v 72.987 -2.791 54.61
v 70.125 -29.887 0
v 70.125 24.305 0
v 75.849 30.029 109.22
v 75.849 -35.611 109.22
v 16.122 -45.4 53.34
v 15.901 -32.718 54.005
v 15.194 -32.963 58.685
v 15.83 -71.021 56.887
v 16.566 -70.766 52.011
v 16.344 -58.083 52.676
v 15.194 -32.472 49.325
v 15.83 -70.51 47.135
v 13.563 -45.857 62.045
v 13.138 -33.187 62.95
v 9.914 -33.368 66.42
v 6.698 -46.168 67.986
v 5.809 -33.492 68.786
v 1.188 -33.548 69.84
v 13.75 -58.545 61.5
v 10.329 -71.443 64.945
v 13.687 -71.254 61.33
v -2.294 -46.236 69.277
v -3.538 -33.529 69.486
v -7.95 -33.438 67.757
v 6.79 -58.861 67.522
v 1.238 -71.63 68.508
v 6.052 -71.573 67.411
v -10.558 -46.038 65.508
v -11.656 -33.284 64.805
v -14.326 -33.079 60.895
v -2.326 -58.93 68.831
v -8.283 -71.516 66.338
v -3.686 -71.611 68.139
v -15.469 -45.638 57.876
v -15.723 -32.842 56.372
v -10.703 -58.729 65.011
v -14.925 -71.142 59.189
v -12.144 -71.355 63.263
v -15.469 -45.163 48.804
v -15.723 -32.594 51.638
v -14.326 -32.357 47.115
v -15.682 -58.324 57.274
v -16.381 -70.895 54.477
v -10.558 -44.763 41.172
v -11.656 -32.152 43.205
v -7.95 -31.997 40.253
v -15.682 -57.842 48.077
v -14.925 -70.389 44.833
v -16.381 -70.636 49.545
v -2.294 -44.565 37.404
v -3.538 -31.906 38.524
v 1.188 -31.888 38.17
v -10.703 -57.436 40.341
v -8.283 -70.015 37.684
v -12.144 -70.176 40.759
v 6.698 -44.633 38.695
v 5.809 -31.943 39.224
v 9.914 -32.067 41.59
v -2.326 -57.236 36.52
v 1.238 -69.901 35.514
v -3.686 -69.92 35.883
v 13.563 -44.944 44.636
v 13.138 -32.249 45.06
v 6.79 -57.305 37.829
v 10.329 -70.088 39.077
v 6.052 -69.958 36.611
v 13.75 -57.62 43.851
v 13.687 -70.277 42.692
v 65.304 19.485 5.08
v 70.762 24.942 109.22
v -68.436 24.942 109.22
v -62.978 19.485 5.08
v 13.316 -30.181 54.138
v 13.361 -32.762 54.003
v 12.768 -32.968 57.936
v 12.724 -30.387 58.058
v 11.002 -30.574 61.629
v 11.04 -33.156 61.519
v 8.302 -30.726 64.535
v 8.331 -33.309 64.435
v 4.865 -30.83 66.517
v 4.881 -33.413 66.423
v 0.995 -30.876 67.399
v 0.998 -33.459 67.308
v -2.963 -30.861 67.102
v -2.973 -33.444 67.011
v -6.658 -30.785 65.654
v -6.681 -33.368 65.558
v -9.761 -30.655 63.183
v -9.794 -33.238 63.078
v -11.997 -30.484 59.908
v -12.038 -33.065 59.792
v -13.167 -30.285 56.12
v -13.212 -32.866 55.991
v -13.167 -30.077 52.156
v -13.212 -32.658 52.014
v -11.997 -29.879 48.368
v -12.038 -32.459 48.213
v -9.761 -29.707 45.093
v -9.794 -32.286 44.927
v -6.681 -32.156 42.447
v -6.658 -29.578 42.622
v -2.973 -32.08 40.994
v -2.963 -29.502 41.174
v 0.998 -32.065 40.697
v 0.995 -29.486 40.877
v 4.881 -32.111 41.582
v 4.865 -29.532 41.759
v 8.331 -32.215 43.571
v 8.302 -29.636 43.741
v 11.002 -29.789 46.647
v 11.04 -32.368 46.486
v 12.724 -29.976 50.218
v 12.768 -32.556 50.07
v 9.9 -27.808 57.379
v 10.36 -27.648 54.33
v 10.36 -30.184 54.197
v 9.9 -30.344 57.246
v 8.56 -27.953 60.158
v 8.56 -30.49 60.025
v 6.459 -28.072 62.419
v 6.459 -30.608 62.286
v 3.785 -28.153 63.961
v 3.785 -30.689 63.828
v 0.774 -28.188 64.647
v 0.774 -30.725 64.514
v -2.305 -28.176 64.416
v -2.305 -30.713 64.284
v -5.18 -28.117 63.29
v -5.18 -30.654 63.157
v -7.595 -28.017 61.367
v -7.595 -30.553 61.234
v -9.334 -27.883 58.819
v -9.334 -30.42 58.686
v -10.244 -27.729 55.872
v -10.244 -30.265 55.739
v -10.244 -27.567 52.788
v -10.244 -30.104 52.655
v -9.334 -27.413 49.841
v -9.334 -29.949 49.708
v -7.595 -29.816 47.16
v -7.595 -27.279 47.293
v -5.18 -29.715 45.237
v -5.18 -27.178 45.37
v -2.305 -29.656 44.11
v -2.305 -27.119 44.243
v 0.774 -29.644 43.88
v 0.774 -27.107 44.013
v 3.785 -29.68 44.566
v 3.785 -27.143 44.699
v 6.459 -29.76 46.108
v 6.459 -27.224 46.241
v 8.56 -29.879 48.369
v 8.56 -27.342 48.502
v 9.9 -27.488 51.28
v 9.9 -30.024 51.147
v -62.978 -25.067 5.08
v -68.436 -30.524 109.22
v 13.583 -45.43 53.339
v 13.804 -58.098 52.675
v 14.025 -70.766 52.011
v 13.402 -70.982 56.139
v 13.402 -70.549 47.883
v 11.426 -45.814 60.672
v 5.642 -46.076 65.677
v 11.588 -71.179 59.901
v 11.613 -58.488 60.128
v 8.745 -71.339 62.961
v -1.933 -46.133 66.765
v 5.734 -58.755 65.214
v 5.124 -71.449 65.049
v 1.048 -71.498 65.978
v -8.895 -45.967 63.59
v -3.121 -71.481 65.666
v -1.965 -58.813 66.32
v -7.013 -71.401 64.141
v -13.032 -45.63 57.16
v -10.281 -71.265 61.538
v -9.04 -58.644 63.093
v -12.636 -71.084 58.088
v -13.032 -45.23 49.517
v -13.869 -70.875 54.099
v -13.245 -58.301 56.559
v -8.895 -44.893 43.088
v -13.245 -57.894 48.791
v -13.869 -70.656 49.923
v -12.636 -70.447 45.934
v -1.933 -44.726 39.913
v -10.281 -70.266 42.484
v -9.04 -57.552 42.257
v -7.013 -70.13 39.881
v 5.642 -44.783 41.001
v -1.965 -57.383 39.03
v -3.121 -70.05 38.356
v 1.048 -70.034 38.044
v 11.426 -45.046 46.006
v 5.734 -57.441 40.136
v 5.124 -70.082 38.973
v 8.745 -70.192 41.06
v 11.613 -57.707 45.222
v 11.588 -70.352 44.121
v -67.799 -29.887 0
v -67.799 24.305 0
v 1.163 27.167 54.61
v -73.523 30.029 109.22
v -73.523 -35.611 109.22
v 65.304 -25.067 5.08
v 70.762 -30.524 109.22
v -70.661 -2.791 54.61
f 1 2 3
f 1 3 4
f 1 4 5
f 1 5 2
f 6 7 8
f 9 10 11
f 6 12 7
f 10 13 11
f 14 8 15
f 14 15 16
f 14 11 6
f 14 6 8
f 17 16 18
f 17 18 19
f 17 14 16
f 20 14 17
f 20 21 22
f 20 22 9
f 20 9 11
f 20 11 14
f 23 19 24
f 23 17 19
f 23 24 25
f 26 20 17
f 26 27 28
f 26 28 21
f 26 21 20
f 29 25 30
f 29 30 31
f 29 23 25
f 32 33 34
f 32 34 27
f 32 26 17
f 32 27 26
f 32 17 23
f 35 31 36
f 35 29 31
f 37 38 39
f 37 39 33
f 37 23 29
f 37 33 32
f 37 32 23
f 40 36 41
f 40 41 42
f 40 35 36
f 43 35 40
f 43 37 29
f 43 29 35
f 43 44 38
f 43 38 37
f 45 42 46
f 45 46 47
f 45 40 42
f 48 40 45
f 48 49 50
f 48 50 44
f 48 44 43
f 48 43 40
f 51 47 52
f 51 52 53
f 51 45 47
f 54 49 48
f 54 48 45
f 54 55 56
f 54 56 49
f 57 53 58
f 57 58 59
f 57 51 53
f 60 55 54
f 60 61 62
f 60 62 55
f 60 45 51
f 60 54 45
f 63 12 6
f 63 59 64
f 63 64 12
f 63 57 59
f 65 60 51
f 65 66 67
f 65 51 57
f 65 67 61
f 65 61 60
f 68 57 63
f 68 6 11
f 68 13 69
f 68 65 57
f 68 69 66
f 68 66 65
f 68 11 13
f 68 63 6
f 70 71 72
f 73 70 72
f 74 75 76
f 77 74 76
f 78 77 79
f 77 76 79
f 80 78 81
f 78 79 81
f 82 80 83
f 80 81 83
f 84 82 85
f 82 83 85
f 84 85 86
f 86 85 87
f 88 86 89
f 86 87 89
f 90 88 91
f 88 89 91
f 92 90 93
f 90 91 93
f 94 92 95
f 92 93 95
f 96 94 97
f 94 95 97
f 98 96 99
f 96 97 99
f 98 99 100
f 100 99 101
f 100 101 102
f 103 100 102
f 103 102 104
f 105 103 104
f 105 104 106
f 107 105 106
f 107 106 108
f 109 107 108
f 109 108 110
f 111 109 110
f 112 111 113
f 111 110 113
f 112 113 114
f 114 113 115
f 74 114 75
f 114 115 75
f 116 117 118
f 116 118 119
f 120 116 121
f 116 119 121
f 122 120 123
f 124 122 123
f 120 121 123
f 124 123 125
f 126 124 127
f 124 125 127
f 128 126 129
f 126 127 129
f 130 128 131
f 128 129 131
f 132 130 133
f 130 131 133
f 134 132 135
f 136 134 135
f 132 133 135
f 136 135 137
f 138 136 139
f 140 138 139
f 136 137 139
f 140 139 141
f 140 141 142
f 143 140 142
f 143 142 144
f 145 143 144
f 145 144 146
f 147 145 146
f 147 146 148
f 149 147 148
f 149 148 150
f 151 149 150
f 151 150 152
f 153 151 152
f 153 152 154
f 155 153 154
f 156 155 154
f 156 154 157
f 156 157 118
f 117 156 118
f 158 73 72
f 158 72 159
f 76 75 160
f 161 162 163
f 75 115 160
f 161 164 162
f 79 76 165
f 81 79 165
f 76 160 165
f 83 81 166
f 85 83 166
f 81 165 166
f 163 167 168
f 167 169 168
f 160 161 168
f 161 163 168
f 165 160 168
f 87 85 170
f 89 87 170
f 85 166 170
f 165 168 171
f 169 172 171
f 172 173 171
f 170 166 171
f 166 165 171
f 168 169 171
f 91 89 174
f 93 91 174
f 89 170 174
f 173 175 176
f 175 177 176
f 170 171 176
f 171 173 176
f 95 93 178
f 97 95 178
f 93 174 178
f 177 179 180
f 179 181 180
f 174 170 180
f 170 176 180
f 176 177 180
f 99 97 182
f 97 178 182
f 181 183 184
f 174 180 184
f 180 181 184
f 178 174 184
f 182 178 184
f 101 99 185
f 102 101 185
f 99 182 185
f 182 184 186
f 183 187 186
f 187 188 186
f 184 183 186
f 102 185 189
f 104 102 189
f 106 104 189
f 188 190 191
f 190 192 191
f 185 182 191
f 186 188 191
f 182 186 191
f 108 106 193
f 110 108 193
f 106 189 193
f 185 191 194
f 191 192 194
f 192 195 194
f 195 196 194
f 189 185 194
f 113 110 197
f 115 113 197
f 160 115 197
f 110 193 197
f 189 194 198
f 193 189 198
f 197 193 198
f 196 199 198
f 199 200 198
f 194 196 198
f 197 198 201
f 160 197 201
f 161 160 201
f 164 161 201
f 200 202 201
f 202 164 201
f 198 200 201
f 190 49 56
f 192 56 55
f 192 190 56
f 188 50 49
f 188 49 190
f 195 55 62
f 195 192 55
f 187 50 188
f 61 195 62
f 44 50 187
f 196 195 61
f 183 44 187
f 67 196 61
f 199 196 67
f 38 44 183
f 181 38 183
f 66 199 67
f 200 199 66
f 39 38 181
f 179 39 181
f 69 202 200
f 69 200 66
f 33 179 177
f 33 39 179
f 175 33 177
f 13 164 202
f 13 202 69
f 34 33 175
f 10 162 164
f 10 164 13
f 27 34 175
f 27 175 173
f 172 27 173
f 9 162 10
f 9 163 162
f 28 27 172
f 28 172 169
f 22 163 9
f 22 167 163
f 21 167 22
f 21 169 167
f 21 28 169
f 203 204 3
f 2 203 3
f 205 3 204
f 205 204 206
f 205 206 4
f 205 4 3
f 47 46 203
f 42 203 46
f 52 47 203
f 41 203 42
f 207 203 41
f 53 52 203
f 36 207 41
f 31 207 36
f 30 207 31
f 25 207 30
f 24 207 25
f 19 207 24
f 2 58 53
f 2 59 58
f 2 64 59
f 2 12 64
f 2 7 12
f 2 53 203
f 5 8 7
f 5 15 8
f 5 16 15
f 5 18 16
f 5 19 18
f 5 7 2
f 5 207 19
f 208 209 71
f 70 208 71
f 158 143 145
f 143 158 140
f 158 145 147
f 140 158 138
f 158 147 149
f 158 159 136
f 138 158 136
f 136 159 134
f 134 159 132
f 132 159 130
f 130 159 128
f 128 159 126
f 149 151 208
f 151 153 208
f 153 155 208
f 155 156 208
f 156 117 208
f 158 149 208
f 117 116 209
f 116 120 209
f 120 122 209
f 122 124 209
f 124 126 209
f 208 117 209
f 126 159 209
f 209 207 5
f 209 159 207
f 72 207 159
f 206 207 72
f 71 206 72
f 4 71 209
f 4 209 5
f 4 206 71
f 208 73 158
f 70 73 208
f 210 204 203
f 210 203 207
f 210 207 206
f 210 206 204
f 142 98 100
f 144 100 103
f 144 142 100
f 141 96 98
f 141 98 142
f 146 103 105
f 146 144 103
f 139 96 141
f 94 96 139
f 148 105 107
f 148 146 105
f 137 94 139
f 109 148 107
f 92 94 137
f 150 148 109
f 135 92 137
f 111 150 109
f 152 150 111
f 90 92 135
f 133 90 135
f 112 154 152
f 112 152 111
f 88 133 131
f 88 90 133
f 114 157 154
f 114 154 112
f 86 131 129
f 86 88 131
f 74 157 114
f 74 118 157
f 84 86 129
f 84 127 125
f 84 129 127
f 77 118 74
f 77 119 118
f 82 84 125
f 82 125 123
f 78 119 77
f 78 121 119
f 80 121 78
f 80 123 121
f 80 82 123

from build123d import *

# Parameters (mm, degrees)
F0_W          = 137.9242166877
F0_H          = 54.1928205639
F1_DEPTH      = 109.22
F1_TAPER      = -3
F2_T          = -5.08
F3_R          = 15.9007904293
F4_DEPTH      = 38.1
F4_TAPER      = -1
F5_T          = 2.54
F5_T3_DEPTH   = 109.5056366308
F5_T5_DEPTH   = 133.3627366899
F5_T7_DEPTH   = 109.5056366308
F5_T9_DEPTH   = 49.6313405661
F5_T11_DEPTH  = 109.5056366308
F5_T13_DEPTH  = 109.5056366308
F6_R          = 10.3601813923
F7_DEPTH      = 28.194
F7_DEPTH_BACK = 25.4


# Not quite as in the source:
# - a shell that OpenCascade refuses in one call is made with other operations: the cavity is built on its own and cut out


with BuildPart() as f1:
    # F0 (on Top) → F1 (new body)
    with BuildSketch(Plane.XY):
        with Locations((1.1629350483, -2.7910461649)):
            Rectangle(F0_W, F0_H)
    extrude(amount=F1_DEPTH, taper=F1_TAPER)

    # F2
    f2_openings = [f1.faces().sort_by_distance(p)[0] for p in [
        (1.162935, -2.791046, 109.22),
    ]]
    offset(amount=F2_T, openings=f2_openings)

    # F3 (on face) → F4 (join)
    with BuildSketch(Plane(origin=(0, -29.8055931401, -1.5620449467), x_dir=(1, 0, 0), z_dir=(0, -0.9986295348, -0.0523359562))):
        with Locations((0, 55.6432977319)):
            Circle(F3_R)
    extrude(amount=F4_DEPTH, taper=F4_TAPER)

    # F5: shell of thickness 2.54, made by hand


with BuildPart() as f5_core1:
    # F5_t2: copy of F1
    add(f1.part)

    # the walls: a layer under each face that stays
    f5_faces = [f5_core1.faces().sort_by_distance(p)[0] for p in [
        (1.1629350483, 27.1673529437, 54.61),
        (1.1629350483, -2.7910461649, 0),
        (-70.6611621221, -2.7910461649, 54.61),
        (72.0872036906, 9.6217245219, 109.22),
        (72.9870322188, -2.7910461649, 54.61),
        (-45.4478013646, -30.8414527224, 18.2033333333),
        (1.1629350483, -27.7955895152, 57.15),
        (68.0331764605, -2.7910461649, 57.15),
        (1.1629350483, 22.2134971854, 57.15),
        (-65.7073063639, -2.7910461649, 57.15),
        (-16.2333094162, -51.7416309725, 53.0079956131),
        (1.1629350483, -2.7910461649, 5.08),
    ]]
    thicken(f5_faces, amount=-F5_T, mode=Mode.SUBTRACT)

    # F5_s4 → F5_t3 (cut)
    with BuildSketch(Plane(origin=(-0.3725269372, -0.3725269372, 7.1082374087), x_dir=(0.7071067812, -0.7071067812, 0), z_dir=(-0.0522644277, -0.0522644277, 0.9972646886))):
        Polygon((-26.8076320701, -61.6755807303), (-25.0140422716, -63.5100601973), (-26.8076320701, -65.2987439692), (-28.6012218685, -63.5100601973), align=None)
    extrude(amount=F5_T3_DEPTH, mode=Mode.SUBTRACT)

    # F5_s6 → F5_t5 (cut)
    with BuildSketch(Plane.YZ.offset(-65.5184332966)):
        Polygon((-25.0413512578, 5.1067293333), (-27.6032354663, 4.9470666711), (-27.4770864474, 2.54), (-25.066716448, 2.54), align=None)
        Polygon((19.4592589279, 5.1067293333), (22.0211431364, 4.9470666711), (21.8949941176, 2.54), (19.4846241181, 2.54), align=None)
    extrude(amount=F5_T5_DEPTH, mode=Mode.SUBTRACT)

    # F5_s8 → F5_t7 (cut)
    with BuildSketch(Plane(origin=(0.3788802151, -0.3788802151, 7.229465173), x_dir=(0.7071067812, 0.7071067812, 0), z_dir=(0.0522644277, -0.0522644277, 0.9972646886))):
        Polygon((28.4522705876, -63.3157206494), (26.6586807892, -65.1502001164), (28.4522705876, -66.9388838882), (30.245860386, -65.1502001164), align=None)
    extrude(amount=F5_T7_DEPTH, mode=Mode.SUBTRACT)

    # F5_s10 → F5_t9 (cut)
    with BuildSketch(Plane.XZ.offset(-22.0246241181)):
        Polygon((65.2789382031, 5.1067293333), (67.8408224115, 4.9470666711), (67.7146733927, 2.54), (65.3043033933, 2.54), align=None)
        Polygon((-62.9530681064, 5.1067293333), (-65.5149523149, 4.9470666711), (-65.388803296, 2.54), (-62.9784332966, 2.54), align=None)
    extrude(amount=F5_T9_DEPTH, mode=Mode.SUBTRACT)

    # F5_s12 → F5_t11 (cut)
    with BuildSketch(Plane(origin=(6.0868817641, 6.0868817641, 116.1446229433), x_dir=(0.7071067812, -0.7071067812, 0), z_dir=(-0.0522644277, -0.0522644277, -0.9972646886))):
        Polygon((32.3994059273, -59.3793819539), (34.1929957257, -61.2138614209), (32.3994059273, -63.0025451928), (30.6058161288, -61.2138614209), align=None)
    extrude(amount=F5_T11_DEPTH, mode=Mode.SUBTRACT)

    # F5_s14 → F5_t13 (cut)
    with BuildSketch(Plane(origin=(-0.357279059, 0.357279059, 6.8172905608), x_dir=(-0.7071067812, -0.7071067812, 0), z_dir=(-0.0522644277, 0.0522644277, 0.9972646886))):
        Polygon((30.7547674097, -57.7392420349), (28.9611776113, -59.5737215018), (30.7547674097, -61.3624052737), (32.5483572082, -59.5737215018), align=None)
    extrude(amount=F5_T13_DEPTH, mode=Mode.SUBTRACT)

    # F5_s15 → F5_t16 (revolve, cut)
    with BuildSketch(Plane(origin=(0, -2.9121451953, 55.5670405262), x_dir=(1, 0, 0), z_dir=(0, 0.0523359562, -0.9986295348))):
        Polygon((15.9261865608, 29.8714534354), (15.9007904293, 27.3064967266), (13.3160676512, 27.3064967266), (13.3611772836, 29.8908258389), align=None)
    revolve(axis=Axis((0, -32.7177383354, 54.0049955795), (0, -0.9986295348, -0.0523359562)), mode=Mode.SUBTRACT)


with BuildPart() as f1_1:
    add(f1.part)

    # what is left inside the walls is the cavity
    f5_cavity = [f5_core1.part.solids().sort_by_distance(p)[0] for p in [
        (-13.557203, -45.430288, 53.338759),
    ]]
    add(f5_cavity, mode=Mode.SUBTRACT)

    # F6 (on face) → F7 (cut, two sides)
    with BuildSketch(Plane(origin=(0, -29.8055931401, -1.5620449467), x_dir=(1, 0, 0), z_dir=(0, -0.9986295348, -0.0523359562))) as f7_sk:
        with Locations((0, 55.7023957372)):
            Circle(F6_R)
    extrude(amount=-F7_DEPTH, mode=Mode.SUBTRACT)
    extrude(f7_sk.sketch, amount=F7_DEPTH_BACK, mode=Mode.SUBTRACT)


solid = f1_1.part
